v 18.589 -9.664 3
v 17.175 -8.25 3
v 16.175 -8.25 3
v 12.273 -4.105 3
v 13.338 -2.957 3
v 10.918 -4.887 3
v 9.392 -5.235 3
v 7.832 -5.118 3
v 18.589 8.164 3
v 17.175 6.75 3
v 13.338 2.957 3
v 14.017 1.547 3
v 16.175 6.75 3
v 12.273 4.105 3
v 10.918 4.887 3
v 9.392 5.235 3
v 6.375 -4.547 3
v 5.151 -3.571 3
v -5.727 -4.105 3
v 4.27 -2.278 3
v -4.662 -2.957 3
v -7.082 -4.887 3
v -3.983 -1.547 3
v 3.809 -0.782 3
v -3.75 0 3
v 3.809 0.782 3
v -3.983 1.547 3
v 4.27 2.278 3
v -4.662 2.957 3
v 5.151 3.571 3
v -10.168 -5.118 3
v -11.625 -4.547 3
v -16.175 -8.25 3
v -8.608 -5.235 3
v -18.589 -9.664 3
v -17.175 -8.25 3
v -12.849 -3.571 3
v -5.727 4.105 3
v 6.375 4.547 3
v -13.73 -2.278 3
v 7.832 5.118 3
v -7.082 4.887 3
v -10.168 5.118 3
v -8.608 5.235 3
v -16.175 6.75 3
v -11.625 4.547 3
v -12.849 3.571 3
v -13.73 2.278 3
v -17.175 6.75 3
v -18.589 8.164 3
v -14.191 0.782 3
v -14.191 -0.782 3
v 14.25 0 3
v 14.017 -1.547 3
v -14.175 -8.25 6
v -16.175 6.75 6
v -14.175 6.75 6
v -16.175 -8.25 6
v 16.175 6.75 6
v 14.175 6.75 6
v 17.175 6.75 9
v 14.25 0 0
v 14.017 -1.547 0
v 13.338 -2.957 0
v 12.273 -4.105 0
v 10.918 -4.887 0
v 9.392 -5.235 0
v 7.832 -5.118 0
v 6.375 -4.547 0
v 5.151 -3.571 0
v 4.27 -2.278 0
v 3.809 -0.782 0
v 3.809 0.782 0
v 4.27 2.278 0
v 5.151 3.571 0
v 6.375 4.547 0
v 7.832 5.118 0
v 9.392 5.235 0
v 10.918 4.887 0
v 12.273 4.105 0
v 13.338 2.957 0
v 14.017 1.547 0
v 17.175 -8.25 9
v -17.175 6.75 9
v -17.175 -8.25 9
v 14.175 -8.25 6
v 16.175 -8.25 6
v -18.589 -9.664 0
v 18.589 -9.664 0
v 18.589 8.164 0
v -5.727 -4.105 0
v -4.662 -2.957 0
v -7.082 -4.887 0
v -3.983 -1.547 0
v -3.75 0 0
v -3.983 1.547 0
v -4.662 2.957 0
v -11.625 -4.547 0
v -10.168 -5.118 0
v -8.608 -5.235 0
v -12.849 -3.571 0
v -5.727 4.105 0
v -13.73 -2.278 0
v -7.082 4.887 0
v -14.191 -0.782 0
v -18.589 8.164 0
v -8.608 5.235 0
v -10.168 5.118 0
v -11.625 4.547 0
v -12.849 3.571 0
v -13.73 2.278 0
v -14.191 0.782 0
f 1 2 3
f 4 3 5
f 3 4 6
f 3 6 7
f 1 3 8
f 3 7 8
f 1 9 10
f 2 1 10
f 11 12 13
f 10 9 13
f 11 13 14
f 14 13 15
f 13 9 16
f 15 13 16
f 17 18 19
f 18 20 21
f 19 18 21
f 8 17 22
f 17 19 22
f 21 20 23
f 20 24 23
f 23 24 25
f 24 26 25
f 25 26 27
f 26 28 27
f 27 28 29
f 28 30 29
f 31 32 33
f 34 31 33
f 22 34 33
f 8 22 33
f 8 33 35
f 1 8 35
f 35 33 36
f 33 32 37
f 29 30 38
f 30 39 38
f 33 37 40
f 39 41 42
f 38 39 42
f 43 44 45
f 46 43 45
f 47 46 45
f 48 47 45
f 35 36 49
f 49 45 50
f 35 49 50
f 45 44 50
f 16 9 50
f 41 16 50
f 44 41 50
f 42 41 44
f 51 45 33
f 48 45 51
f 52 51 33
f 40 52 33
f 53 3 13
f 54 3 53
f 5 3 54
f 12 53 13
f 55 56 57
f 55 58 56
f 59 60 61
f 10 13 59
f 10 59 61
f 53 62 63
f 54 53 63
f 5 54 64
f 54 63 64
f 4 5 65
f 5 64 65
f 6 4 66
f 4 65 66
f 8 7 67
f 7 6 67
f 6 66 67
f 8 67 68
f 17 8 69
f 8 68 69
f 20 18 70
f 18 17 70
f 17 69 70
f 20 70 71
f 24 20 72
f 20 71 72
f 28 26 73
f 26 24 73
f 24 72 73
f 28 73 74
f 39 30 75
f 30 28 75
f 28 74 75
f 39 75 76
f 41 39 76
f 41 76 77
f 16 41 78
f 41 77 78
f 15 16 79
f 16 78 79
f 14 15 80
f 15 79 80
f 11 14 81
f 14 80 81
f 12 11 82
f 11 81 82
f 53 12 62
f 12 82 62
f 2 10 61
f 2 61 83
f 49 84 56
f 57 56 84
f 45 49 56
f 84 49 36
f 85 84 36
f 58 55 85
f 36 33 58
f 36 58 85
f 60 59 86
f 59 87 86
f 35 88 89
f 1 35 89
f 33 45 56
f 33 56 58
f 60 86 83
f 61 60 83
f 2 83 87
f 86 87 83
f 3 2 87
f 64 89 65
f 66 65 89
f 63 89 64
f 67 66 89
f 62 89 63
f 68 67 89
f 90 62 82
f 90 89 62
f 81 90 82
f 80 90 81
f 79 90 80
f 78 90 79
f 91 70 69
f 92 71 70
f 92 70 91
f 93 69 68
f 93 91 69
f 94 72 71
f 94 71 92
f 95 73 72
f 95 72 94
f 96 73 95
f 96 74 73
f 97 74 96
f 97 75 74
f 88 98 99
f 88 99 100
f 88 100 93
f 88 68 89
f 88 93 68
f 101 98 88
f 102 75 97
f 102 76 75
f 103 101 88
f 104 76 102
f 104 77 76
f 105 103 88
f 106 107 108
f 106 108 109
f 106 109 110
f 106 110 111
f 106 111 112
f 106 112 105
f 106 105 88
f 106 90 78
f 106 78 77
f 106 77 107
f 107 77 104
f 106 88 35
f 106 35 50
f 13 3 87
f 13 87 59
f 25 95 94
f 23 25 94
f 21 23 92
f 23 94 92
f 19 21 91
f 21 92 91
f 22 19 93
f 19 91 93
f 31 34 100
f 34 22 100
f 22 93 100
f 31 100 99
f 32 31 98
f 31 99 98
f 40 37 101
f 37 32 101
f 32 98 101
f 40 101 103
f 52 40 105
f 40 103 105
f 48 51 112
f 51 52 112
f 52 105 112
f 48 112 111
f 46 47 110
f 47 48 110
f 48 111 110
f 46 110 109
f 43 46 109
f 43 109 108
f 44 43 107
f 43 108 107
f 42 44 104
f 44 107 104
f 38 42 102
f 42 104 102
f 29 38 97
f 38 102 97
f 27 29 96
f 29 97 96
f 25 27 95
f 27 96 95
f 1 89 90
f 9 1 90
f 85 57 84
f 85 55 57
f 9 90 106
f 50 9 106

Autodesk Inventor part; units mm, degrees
ref_plane "YZ Plane" through (0, 0, 0) normal (1, 0, 0) x (0, 1, 0)
ref_plane "XZ Plane" through (0, 0, 0) normal (0, 1, 0) x (-1, 0, 0)
ref_plane "XY Plane" through (0, 0, 0) normal (0, 0, 1) x (1, 0, 0)
sketch "Sketch1" plane through (0, 0, 0) normal (0, 0, 1) x (1, 0, 0)
  circle A0 centre (-9, 0) radius 5.25
  circle A1 centre (9, 0) radius 5.25
  line L0 (-16.175, 6.75) -> (16.175, 6.75)
  line L1 (-16.175, -8.25) -> (-16.175, 6.75)
  line L2 (16.175, -8.25) -> (-16.175, -8.25)
  line L3 (16.175, 6.75) -> (16.175, -8.25)
  line L4 (-16.175, 6.75) -> (16.175, -8.25) construction
  line L5 (16.175, 6.75) -> (-16.175, -8.25) construction
  point P0 (0, 0)
  point P1 (0, -7.6531)
  point P2 (14.6494, -5.75)
  point P3 (0, -0.75)
  dimension "d2" = 10.5
  dimension "d3" = 32.35
  dimension "d4" = 32.35
  dimension "d5" = 16.175
  dimension "d6" = 15
  dimension "d7" = 15
  dimension "d8" = 12.5
  dimension "d9" = 18
  dimension "d12" = 9
  dimension "d13" = 9
  dimension "d14" = 10.5
  dimension "d15" = 6.75
  dimension "d16" = 6.75
extrude "Extrusion1" add sketch "Sketch1" along normal blind 3
sketch "Sketch2" plane through (0, 0, 0) normal (0, 0, -1) x (-1, 0, 0)
  circle A0 centre (-9, 0) radius 5.25 projected
  circle A1 centre (9, 0) radius 5.25 projected
  line L0 (-16.175, 6.75) -> (16.175, 6.75) projected
  line L1 (-16.175, -8.25) -> (-16.175, 6.75) projected
  line L2 (16.175, -8.25) -> (-16.175, -8.25) projected
  line L3 (16.175, 6.75) -> (16.175, -8.25) projected
  line L4 (-16.175, 6.75) -> (-17.175, 6.75)
  line L5 (-17.175, 6.75) -> (-17.175, -8.25)
  line L6 (-17.175, -8.25) -> (-16.175, -8.25)
  line L7 (-16.175, -8.25) -> (-16.175, 6.75)
  line L8 (16.175, 6.75) -> (17.175, 6.75)
  line L9 (17.175, 6.75) -> (17.175, -8.25)
  line L10 (17.175, -8.25) -> (16.175, -8.25)
  line L11 (16.175, -8.25) -> (16.175, 6.75)
  point P0 (0, 0)
  dimension "d17" = 1
  dimension "d18" = 1
extrude "Extrusion2" add sketch "Sketch2" against normal blind 6 contours L1 L6 L5 L4 | L8 L9 L10 L3
sketch "Sketch3" plane through (-17.175, -8.25, 0) normal (0, -1, 0) x (1, 0, 0)
  line L0 (0, 6) -> (3, 6)
  line L1 (3, 6) -> (0, 9)
  line L2 (0, 9) -> (0, 6)
  line L3 (34.35, 6) -> (31.35, 6)
  line L4 (34.35, 6) -> (33.35, 6) projected
  line L5 (31.35, 6) -> (34.35, 9)
  line L6 (34.35, 9) -> (34.35, 6)
  point P0 (17.175, 0)
  dimension "d21" = 45
  dimension "d22" = 3
  dimension "d23" = 45
  dimension "d35" = 3
extrude "Extrusion3" add sketch "Sketch3" against normal blind 15
sketch "Sketch4" plane through (0, 0, 0) normal (0, 0, -1) x (-1, 0, 0)
  circle A0 centre (-9, 0) radius 5.25 projected
  circle A1 centre (9, 0) radius 5.25 projected
  line L0 (-17.175, 6.75) -> (17.175, 6.75) projected
  line L1 (-17.175, 6.75) -> (-17.175, -8.25) projected
  line L2 (-17.175, -8.25) -> (17.175, -8.25) projected
  line L3 (17.175, -8.25) -> (17.175, 6.75) projected
  line L4 (17.175, -8.25) -> (18.5892, -9.6642)
  line L5 (17.175, -8.25) -> (19.175, -8.25) construction
  line L6 (17.175, 6.75) -> (18.5892, 8.1642)
  line L7 (17.175, 6.75) -> (19.175, 6.75) construction
  line L8 (-17.175, 6.75) -> (-18.5892, 8.1642)
  line L9 (-17.175, 6.75) -> (-15.175, 6.75) construction
  line L10 (-17.175, 6.75) -> (-17.175, -8.25) projected
  line L11 (-18.5892, 8.1642) -> (18.5892, 8.1642)
  line L12 (18.5892, -9.6642) -> (18.5892, 8.1642)
  line L13 (18.5892, -9.6642) -> (-18.5892, -9.6642)
  line L14 (18.5892, -9.6642) -> (55.7676, -9.6642) construction
  line L15 (-18.5892, -9.6642) -> (-18.5892, 8.1642)
  point P0 (0, 0)
  dimension "d26" = 2
  dimension "d27" = 45
  dimension "d28" = 2
  dimension "d29" = 45
  dimension "d30" = 2
  dimension "d31" = 135
  dimension "d32" = 180
extrude "Extrusion4" add sketch "Sketch4" against normal blind 3 contours L8 L11 L6 L0 | L1 L2 L4 L13 L15 L8 | L6 L12 L4 L3
equation "\"d4\" = d3"
equation "\"d5\" = 0.5 * d4"
equation "\"d7\" = d6"
equation "\"d12\" = 0.5 * d9"
equation "\"d13\" = d12"
equation "\"d14\" = d2"
equation "\"d16\" = d15"
